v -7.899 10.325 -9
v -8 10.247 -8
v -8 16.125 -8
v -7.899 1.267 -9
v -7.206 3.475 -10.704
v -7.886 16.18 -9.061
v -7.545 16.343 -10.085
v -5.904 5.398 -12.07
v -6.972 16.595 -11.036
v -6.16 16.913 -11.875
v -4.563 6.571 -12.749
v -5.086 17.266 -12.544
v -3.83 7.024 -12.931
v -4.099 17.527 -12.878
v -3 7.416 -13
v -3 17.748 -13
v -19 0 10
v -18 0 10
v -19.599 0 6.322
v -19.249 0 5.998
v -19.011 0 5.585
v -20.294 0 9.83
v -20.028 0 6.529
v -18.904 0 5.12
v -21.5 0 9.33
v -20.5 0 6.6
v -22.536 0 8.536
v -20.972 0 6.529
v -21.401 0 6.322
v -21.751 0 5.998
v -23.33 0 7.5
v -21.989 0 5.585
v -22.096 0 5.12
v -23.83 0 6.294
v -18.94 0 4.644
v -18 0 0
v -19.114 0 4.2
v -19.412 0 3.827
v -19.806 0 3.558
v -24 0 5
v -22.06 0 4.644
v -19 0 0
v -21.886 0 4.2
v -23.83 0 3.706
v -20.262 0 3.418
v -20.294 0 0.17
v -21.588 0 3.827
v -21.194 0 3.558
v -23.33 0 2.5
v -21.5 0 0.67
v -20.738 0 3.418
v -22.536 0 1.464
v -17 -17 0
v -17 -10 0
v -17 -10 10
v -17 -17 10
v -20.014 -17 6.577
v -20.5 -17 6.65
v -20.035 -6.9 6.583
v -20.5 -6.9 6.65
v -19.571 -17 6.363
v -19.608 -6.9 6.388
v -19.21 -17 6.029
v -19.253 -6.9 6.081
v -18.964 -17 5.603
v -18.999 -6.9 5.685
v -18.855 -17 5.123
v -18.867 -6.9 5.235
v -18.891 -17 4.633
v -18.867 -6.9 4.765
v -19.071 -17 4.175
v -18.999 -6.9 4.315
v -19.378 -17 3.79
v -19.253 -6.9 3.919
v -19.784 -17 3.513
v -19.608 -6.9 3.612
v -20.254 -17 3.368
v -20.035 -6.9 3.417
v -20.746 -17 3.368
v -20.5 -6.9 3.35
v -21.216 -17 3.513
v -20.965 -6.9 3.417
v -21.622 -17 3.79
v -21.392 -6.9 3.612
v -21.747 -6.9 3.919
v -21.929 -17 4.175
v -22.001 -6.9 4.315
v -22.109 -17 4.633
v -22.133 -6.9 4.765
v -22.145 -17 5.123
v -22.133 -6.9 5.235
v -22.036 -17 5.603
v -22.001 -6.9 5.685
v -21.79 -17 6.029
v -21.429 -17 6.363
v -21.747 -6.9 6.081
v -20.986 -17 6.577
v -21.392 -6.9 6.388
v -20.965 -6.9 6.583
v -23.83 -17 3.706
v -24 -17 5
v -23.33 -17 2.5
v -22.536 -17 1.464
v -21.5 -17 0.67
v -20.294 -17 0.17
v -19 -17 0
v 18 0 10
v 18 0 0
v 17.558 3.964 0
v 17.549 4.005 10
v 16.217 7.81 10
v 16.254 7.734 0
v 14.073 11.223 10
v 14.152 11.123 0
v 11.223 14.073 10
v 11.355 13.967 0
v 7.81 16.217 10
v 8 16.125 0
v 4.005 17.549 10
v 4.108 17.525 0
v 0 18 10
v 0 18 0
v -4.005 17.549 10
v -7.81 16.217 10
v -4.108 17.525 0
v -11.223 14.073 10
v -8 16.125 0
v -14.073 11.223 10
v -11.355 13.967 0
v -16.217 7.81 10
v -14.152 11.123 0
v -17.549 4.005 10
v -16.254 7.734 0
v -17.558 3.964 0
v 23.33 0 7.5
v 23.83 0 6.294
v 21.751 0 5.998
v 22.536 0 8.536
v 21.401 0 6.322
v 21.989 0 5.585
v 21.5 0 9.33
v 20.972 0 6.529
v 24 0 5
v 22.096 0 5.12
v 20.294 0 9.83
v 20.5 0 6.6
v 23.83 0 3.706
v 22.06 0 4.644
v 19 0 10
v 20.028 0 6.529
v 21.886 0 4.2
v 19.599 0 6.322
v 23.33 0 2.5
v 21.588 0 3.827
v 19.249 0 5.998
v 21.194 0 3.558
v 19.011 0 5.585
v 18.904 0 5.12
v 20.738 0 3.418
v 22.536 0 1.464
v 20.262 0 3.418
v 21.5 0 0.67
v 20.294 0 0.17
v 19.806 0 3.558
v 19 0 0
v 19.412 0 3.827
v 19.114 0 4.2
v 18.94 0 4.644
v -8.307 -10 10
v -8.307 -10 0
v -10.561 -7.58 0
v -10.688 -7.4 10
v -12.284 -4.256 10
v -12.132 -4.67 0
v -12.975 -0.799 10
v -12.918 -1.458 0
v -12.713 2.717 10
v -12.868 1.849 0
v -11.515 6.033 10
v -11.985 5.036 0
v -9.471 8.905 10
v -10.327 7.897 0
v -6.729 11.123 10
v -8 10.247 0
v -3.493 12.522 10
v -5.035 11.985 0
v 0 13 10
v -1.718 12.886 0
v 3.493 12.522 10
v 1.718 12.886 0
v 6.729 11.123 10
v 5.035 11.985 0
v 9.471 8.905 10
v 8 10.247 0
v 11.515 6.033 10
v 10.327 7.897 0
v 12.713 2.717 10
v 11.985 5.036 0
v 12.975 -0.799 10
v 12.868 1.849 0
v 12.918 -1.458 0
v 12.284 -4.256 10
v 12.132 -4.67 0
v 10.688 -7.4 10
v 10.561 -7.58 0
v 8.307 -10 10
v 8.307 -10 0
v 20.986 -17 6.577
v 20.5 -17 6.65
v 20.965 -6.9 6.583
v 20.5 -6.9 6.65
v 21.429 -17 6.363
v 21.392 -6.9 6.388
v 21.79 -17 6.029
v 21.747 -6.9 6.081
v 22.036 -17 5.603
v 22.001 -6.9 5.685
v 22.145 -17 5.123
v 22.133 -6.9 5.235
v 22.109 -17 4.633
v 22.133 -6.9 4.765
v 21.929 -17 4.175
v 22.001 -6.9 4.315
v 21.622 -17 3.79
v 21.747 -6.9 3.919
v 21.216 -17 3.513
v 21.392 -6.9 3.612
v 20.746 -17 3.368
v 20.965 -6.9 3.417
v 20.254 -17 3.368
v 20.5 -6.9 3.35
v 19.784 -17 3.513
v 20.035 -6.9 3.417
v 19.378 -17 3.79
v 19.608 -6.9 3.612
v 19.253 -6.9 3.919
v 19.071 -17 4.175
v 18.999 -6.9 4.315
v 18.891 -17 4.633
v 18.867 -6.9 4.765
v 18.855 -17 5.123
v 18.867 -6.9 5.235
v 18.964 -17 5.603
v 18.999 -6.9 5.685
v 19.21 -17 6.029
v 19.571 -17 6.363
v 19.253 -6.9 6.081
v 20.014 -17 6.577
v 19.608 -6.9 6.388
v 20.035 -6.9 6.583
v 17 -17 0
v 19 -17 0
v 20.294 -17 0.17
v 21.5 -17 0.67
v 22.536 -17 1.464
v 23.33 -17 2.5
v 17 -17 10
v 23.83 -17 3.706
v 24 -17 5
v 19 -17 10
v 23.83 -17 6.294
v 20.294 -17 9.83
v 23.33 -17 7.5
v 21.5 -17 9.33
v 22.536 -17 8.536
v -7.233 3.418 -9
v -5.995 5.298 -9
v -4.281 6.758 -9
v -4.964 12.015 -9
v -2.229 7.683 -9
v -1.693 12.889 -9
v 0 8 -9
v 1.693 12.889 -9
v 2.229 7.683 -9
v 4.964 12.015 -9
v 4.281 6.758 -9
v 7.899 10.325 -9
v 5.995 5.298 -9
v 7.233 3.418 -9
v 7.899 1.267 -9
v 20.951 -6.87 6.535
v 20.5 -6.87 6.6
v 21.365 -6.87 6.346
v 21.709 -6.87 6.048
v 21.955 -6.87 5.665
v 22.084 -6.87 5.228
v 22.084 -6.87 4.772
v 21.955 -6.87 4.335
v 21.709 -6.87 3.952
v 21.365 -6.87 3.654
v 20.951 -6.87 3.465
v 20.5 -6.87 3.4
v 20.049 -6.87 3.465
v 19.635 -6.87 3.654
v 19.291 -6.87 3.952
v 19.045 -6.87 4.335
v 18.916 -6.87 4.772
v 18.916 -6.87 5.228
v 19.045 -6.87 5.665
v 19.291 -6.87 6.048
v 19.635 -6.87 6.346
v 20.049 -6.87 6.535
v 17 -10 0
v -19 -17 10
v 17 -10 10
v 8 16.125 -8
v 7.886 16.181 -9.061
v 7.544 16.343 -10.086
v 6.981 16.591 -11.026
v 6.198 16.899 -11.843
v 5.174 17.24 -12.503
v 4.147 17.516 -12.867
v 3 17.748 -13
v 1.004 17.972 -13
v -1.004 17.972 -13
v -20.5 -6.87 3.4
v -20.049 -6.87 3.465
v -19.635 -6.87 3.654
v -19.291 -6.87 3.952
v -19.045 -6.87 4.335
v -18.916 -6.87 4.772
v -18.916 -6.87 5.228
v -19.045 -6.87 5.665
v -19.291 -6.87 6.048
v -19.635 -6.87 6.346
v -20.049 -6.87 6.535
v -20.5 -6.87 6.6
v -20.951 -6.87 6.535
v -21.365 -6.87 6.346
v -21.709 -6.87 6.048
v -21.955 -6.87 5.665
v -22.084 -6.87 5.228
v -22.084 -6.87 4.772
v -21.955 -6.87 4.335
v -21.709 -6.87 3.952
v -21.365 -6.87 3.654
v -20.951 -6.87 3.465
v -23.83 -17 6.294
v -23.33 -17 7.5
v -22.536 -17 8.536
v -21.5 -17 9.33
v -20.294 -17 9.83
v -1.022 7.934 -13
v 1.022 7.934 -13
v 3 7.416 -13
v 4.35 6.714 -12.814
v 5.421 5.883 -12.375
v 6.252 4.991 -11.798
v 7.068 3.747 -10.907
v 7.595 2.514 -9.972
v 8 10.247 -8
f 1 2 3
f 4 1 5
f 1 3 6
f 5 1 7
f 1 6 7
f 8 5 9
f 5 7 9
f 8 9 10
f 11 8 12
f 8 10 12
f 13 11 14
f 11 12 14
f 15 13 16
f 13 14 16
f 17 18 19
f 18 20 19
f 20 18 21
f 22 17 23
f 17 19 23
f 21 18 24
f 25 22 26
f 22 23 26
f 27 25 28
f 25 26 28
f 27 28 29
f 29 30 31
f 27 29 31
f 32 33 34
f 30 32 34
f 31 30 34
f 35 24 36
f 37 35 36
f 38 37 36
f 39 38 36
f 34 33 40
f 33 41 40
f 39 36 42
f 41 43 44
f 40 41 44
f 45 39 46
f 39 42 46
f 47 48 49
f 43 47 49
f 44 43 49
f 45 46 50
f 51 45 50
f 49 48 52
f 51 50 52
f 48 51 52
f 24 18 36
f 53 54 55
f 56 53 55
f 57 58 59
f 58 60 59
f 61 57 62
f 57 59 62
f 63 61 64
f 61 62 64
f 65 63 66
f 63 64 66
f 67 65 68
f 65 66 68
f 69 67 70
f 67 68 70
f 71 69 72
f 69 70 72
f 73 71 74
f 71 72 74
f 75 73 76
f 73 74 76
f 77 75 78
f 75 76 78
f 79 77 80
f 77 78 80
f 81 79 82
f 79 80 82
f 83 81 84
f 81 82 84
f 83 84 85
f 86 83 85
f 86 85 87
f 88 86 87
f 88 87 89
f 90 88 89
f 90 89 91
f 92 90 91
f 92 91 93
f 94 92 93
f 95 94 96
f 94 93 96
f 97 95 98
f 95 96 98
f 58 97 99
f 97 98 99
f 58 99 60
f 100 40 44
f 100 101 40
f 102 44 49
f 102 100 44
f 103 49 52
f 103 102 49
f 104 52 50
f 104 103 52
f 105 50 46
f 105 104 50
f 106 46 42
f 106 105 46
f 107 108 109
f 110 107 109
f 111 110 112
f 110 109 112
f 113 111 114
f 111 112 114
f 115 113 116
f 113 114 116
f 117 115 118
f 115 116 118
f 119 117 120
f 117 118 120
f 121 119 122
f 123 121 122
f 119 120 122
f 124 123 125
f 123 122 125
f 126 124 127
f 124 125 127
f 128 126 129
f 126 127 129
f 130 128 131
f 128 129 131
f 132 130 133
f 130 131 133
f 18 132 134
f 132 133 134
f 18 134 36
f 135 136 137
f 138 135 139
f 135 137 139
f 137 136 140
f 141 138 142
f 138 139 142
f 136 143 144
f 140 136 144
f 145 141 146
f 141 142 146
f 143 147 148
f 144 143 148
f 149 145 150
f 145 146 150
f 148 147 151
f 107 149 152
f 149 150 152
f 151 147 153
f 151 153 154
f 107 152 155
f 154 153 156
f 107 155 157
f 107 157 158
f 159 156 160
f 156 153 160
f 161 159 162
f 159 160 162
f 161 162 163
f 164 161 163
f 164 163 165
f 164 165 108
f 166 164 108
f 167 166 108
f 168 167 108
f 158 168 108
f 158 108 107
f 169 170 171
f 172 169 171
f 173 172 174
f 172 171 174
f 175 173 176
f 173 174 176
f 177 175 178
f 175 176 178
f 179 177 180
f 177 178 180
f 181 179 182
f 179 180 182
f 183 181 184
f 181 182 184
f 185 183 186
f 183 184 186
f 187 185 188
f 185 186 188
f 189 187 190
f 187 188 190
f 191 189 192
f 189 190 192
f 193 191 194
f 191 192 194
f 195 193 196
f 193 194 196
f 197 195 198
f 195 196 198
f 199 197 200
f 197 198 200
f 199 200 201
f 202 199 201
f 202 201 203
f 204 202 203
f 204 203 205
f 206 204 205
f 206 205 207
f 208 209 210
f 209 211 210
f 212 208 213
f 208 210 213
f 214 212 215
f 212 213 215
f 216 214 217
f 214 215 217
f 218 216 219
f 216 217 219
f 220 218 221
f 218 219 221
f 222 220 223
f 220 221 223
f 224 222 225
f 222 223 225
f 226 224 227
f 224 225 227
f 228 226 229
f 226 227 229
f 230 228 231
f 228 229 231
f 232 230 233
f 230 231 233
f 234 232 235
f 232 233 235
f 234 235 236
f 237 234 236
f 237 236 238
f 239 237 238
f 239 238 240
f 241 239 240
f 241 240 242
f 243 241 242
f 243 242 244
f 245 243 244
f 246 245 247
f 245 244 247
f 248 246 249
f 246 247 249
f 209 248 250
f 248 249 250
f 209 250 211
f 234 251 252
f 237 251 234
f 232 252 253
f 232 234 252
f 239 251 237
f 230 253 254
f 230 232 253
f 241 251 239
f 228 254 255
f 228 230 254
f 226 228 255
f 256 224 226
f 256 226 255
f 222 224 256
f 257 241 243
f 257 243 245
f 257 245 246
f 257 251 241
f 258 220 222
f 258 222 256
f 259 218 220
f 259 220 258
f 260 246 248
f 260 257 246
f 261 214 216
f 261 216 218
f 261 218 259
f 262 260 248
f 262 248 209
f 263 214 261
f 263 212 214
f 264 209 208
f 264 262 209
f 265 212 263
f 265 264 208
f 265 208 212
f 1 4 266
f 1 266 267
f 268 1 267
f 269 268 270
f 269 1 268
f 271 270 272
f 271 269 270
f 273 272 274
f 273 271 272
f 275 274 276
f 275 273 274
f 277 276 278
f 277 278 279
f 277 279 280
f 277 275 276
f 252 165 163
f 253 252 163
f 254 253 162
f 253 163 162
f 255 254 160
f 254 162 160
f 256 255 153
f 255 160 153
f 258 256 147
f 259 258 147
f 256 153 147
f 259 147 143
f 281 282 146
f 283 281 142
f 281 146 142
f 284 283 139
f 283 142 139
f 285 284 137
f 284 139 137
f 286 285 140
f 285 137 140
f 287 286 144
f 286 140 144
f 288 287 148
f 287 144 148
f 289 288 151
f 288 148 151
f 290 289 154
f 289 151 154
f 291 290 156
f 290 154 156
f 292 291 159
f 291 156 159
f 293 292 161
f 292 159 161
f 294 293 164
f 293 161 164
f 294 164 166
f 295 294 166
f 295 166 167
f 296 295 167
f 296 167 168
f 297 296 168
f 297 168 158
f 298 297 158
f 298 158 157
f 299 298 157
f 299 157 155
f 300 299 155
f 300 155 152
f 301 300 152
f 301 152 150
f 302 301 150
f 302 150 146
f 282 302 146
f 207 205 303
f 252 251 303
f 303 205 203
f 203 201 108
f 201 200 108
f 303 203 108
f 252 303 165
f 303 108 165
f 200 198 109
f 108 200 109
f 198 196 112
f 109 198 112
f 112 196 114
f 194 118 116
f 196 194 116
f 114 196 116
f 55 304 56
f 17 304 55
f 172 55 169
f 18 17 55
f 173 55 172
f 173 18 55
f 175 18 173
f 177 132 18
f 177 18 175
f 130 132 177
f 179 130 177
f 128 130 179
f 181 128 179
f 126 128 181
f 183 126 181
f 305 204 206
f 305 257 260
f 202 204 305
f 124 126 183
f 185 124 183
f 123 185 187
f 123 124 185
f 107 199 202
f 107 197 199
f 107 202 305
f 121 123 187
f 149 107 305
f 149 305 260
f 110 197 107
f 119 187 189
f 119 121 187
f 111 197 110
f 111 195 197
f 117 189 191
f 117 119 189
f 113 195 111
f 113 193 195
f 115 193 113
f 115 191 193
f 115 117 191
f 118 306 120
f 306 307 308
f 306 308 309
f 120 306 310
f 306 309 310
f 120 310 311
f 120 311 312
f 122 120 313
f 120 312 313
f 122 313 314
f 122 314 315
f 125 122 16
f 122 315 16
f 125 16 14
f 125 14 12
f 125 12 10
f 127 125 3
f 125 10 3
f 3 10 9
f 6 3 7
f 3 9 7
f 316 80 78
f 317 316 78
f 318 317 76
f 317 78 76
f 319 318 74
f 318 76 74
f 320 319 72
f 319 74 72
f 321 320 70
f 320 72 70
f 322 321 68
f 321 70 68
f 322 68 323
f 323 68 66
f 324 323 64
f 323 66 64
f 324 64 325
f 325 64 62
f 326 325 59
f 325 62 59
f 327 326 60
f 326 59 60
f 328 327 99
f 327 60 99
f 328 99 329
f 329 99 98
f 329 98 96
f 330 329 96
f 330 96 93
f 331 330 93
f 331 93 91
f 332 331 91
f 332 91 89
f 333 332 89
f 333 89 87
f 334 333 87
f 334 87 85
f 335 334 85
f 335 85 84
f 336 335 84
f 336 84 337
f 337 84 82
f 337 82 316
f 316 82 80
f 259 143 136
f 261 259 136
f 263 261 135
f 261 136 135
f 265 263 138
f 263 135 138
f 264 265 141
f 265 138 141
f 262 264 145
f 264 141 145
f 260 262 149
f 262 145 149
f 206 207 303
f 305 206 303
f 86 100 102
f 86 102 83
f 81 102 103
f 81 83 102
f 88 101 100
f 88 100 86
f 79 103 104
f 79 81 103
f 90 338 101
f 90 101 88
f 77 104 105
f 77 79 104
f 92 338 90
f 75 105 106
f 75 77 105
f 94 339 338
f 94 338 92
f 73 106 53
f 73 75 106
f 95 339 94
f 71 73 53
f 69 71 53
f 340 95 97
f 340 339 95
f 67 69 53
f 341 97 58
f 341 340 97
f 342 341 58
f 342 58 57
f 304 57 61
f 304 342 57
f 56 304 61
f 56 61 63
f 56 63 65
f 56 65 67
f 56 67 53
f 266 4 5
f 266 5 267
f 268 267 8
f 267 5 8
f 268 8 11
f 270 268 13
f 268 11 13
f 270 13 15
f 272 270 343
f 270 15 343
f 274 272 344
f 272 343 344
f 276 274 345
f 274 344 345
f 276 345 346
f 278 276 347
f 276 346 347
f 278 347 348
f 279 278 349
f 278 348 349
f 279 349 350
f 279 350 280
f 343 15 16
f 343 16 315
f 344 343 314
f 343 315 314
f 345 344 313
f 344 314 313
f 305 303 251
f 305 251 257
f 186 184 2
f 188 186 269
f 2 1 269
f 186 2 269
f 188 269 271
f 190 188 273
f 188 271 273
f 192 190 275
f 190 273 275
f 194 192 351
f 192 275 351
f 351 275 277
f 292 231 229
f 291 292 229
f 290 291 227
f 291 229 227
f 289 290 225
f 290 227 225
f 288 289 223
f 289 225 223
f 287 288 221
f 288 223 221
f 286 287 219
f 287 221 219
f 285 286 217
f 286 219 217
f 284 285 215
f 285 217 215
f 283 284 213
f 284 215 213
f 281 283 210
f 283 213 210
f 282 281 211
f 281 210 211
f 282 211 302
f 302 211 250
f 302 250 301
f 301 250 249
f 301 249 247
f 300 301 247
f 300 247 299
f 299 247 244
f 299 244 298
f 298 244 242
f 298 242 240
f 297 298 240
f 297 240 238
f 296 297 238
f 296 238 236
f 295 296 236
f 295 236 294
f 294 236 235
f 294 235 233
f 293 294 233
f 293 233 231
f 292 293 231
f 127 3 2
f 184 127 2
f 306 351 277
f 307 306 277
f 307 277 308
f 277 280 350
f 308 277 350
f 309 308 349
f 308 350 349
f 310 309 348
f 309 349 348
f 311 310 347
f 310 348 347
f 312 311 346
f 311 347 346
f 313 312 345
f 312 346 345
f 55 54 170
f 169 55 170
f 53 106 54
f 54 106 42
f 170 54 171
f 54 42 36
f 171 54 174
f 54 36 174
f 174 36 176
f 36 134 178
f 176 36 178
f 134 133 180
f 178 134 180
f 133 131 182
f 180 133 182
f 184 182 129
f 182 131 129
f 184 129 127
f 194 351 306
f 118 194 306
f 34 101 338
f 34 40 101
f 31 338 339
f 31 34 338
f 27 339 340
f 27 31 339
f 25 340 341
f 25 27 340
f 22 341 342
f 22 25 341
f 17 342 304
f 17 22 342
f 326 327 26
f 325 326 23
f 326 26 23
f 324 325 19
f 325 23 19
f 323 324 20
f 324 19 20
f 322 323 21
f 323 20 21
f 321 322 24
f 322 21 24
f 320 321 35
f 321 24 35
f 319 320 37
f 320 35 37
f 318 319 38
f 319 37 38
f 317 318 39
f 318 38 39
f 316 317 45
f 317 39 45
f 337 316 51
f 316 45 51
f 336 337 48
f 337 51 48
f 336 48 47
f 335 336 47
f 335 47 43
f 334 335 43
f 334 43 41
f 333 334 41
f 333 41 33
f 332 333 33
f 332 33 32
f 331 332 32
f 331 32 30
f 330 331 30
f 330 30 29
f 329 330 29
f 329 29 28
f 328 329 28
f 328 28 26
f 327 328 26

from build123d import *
from build123d.topology import SkipClean

# Parameters (mm, degrees)
SKETCH1_R             = 6
EXTRUDE1_DEPTH        = 10
SKETCH2_R             = 13
CUT_EXTRUDE1_DEPTH    = 6
SKETCH3_R             = 1.6
CUT_EXTRUDE2_DEPTH    = 10
SKETCH4_W             = 7
SKETCH4_H             = 10
SKETCH4_R             = 1.6
EXTRUDE3_DEPTH        = 7
FILLET2_R             = 5
SKETCH5_R             = 13
EXTRUDE4_DEPTH        = 4
EXTRUDE5_START        = 9
EXTRUDE5_DEPTH        = 9
EXTRUDE6_START        = 4
EXTRUDE6_DEPTH        = 4
FILLET3_R             = 5
M4_TAPPED_HOLE1_D     = 3.3
M4_TAPPED_HOLE1_DEPTH = 10.1
M4_TAPPED_HOLE1_TIP   = 0.991420021


# Some blends are built 0.0001 mm under size
with BuildPart() as part:
    # Sketch1 → Extrude1 (new body)
    with BuildSketch(Plane.XY):
        with BuildLine():
            Line((-18, 0), (-24, 0))
            Line((-24, 0), (-24, -10))
            Line((-24, -10), (24, -10))
            Line((24, -10), (24, 0))
            Line((24, 0), (18, 0))
            ThreePointArc((18, 0), (0, 18.000000653), (-18, 0))
        make_face()
        with Locations((0, 6.53e-07)):
            Circle(SKETCH1_R, mode=Mode.SUBTRACT)
    extrude(amount=EXTRUDE1_DEPTH)

    # Sketch2 → Cut-Extrude1 (cut)
    with BuildSketch(Plane(origin=(0, 0, 0), x_dir=(-1, 0, 0), z_dir=(0, 0, -1))):
        Circle(SKETCH2_R)
    extrude(amount=-CUT_EXTRUDE1_DEPTH, mode=Mode.SUBTRACT)

    # Sketch3 → Cut-Extrude2 (cut)
    with BuildSketch(Plane(origin=(0, 0, 0), x_dir=(-1, 0, 0), z_dir=(0, 1, 0))):
        with Locations(Location((-20.5, 5, 0), (0, 0, 90))):
            Circle(SKETCH3_R)
        with Locations(Location((20.5, 5, 0), (0, 0, 90))):
            Circle(SKETCH3_R)
    extrude(amount=-CUT_EXTRUDE2_DEPTH, mode=Mode.SUBTRACT)

    # Sketch4 → Extrude3 (add)
    # profile 1 of 2: a face of its own
    with SkipClean():  # the faces are left unmerged after this step: merging them gives an invalid solid
        with BuildSketch(Plane.XZ.offset(10)):
            with Locations((-20.5, 5)):
                Rectangle(SKETCH4_W, SKETCH4_H)
            with Locations((-20.5, 5)):
                Circle(SKETCH4_R, mode=Mode.SUBTRACT)
        # profile 2 of 2: a face of its own
        with BuildSketch(Plane.XZ.offset(10)):
            with Locations((20.5, 5)):
                Rectangle(SKETCH4_W, SKETCH4_H)
            with Locations((20.5, 5)):
                Circle(SKETCH4_R, mode=Mode.SUBTRACT)
        extrude(amount=EXTRUDE3_DEPTH)
    add(part.part.scale(1), mode=Mode.REPLACE)  # the faces are merged on a copy

    # Fillet2
    fillet2_edges = [part.edges().sort_by_distance(p)[0] for p in [
        (24, -8.5, 10),
        (24, -8.5, 0),
        (-24, -5, 10),
        (-24, -5, 0),
    ]]
    fillet(fillet2_edges, radius=FILLET2_R - 0.0001)  # a hair under: the kernel refuses the full size

    # Sketch5 → Extrude4 (cut)
    with BuildSketch(Plane(origin=(0, 0, 6), x_dir=(-1, 0, 0), z_dir=(0, 0, -1))):
        Circle(SKETCH5_R)
    extrude(amount=-EXTRUDE4_DEPTH, mode=Mode.SUBTRACT)

    # Sketch6 → Extrude5 (add)
    with BuildSketch(Plane(origin=(0, 0, 0), x_dir=(-1, 0, 0), z_dir=(0, 0, -1)).offset(EXTRUDE5_START)):
        with BuildLine():
            Line((-8, 10.246950766), (-8, 16.12451615))
            ThreePointArc((-8, 16.12451615), (0, 18.000000585), (8, 16.12451615))
            Line((8, 16.12451615), (8, 10.246950766))
            ThreePointArc((8, 10.246950766), (0, 13), (-8, 10.246950766))
        make_face()
    extrude(amount=-EXTRUDE5_DEPTH)

    # Sketch7 → Extrude6 (add)
    with BuildSketch(Plane(origin=(0, 0, -9), x_dir=(-1, 0, 0), z_dir=(0, 0, -1)).offset(EXTRUDE6_START)):
        with BuildLine():
            Line((8, 16.12451615), (8, 0))
            ThreePointArc((8, 0), (0, 8), (-8, 0))
            Line((-8, 0), (-8, 16.12451615))
            ThreePointArc((-8, 16.12451615), (0, 18.000000585), (8, 16.12451615))
        make_face()
    extrude(amount=-EXTRUDE6_DEPTH)

    # Fillet3
    # the kernel refuses this fillet: 5 mm, written as the material it takes off along each edge
    with BuildSketch(Plane(origin=(-8, 28.62451615, -13), x_dir=(0, 0, 1), z_dir=(0, -1, 0)), Plane(origin=(8, -12.5, -13), x_dir=(0, 0, 1), z_dir=(0, 1, 0))) as fillet3_piece_1:
        with BuildLine():
            CenterArc((FILLET3_R, -FILLET3_R), FILLET3_R, 90, 90)
            Line((0, -FILLET3_R), (0, 0))
            Line((0, 0), (FILLET3_R, 0))
        make_face()
    extrude(amount=41.12451615, mode=Mode.SUBTRACT)

    # M4 Tapped Hole1
    with Locations(Plane(origin=(-20.5, -17, 5), x_dir=(0, 0, -1), z_dir=(0, -1, 0))):
        with Locations((0, 0), (0, 41)):
            Hole(M4_TAPPED_HOLE1_D / 2, depth=M4_TAPPED_HOLE1_DEPTH)
            with Locations((0, 0, -(M4_TAPPED_HOLE1_DEPTH + M4_TAPPED_HOLE1_TIP / 2))):  # 118° drill point
                Cone(0, M4_TAPPED_HOLE1_D / 2, M4_TAPPED_HOLE1_TIP, mode=Mode.SUBTRACT)


solid = part.part
